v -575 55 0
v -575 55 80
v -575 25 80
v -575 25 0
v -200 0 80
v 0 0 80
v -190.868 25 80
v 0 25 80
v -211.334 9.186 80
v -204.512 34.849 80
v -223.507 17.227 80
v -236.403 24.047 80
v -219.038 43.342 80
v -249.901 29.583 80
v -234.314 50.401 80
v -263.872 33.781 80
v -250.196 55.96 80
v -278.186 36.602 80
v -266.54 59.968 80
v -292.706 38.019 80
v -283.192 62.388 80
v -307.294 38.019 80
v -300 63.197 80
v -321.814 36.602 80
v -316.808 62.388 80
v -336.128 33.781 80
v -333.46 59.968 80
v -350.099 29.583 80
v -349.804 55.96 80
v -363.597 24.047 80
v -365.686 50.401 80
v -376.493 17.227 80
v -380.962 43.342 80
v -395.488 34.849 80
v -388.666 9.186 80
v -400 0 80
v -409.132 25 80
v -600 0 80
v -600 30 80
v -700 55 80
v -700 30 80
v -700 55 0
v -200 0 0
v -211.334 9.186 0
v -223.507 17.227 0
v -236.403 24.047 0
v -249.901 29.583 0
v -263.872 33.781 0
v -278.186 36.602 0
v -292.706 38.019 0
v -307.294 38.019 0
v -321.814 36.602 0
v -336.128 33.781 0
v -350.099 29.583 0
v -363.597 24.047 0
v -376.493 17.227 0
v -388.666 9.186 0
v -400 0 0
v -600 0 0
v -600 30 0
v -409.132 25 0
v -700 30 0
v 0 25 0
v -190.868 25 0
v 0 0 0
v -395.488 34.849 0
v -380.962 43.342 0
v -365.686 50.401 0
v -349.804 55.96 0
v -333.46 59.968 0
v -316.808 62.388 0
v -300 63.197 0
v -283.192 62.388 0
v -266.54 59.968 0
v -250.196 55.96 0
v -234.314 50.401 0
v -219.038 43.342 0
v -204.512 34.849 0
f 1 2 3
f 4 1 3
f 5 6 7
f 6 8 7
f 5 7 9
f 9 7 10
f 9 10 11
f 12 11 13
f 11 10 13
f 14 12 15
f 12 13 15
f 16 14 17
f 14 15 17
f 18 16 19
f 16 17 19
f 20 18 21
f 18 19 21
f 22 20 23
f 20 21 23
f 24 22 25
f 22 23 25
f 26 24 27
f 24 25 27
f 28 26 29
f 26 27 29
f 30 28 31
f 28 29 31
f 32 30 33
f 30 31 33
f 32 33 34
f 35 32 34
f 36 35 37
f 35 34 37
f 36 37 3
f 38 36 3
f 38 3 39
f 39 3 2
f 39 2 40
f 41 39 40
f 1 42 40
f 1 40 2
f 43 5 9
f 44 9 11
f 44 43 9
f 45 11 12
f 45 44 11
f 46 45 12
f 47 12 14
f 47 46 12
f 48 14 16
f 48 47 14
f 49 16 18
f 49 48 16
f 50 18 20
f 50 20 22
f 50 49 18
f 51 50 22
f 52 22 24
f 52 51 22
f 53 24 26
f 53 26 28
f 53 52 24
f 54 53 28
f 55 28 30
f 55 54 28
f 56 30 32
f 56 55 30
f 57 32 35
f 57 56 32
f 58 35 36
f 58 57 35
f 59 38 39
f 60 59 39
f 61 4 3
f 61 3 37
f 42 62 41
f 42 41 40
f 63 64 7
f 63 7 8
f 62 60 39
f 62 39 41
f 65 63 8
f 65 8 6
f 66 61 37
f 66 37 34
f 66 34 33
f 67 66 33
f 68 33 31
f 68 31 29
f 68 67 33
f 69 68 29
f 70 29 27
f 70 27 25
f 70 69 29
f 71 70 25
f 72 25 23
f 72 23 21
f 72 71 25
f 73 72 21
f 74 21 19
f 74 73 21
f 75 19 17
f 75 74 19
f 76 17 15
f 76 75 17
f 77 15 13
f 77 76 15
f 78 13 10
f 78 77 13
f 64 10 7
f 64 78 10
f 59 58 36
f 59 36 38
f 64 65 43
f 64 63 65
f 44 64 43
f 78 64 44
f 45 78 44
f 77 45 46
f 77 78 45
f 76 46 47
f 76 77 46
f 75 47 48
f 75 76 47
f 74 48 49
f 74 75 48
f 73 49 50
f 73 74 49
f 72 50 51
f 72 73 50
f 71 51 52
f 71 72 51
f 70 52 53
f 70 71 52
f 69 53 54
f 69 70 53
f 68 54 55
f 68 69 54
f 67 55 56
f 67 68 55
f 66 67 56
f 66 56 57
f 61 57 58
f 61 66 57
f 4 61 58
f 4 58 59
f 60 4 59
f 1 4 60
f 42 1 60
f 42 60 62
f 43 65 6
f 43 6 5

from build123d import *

# Parameters (mm, degrees)
BOSS_EXTRUDE1_DEPTH = 80


with BuildPart() as part:
    # Sketch1 → Boss-Extrude1 (new body)
    with BuildSketch(Plane.XY):
        with BuildLine():
            Line((0, 0), (-200, 0))
            ThreePointArc((-200, 0), (-300, 38.196601125), (-400, 0))
            Line((-400, 0), (-600, 0))
            Line((-600, 0), (-600, 30))
            Line((-600, 30), (-700, 30))
            Line((-700, 30), (-700, 55))
            Line((-700, 55), (-575, 55))
            Line((-575, 55), (-575, 25))
            Line((-575, 25), (-409.132167834, 25))
            ThreePointArc((-409.132167834, 25), (-300, 63.196601125), (-190.867832166, 25))
            Line((-190.867832166, 25), (0, 25))
            Line((0, 25), (0, 0))
        make_face()
    extrude(amount=BOSS_EXTRUDE1_DEPTH)


solid = part.part
